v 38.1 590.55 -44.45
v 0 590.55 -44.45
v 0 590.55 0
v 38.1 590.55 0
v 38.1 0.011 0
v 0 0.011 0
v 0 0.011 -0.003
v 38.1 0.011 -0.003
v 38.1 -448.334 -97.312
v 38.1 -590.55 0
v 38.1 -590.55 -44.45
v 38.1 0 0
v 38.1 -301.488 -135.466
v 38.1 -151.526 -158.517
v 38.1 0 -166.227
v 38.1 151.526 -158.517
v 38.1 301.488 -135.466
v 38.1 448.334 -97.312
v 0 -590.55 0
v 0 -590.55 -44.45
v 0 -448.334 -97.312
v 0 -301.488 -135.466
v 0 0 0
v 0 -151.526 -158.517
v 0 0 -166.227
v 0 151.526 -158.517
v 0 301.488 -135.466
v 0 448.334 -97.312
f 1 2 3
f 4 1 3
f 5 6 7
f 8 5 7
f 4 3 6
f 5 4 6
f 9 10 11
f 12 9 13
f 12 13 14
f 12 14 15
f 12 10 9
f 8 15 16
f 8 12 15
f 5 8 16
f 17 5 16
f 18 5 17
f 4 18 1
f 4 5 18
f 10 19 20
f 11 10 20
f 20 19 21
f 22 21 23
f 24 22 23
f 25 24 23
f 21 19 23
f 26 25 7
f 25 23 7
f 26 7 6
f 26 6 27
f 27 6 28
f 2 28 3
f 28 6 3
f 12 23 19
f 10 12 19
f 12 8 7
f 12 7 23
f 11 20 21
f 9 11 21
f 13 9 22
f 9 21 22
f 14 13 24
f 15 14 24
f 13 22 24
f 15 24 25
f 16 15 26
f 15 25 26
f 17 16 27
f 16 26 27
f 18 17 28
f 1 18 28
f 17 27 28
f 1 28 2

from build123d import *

# Parameters (mm, degrees)
F0_DEPTH = 38.1


with BuildPart() as f0:
    # F2 (on Right) → F0 (new body)
    with BuildSketch(Plane.YZ):
        with BuildLine():
            Line((0, 0), (-590.55, 0))
            Line((-590.55, 0), (-590.55, -44.45))
            ThreePointArc((-590.55, -44.45), (0, -166.226991), (590.55, -44.45))
            Line((590.55, -44.45), (590.55, 0))
            Line((590.55, 0), (0.01061, 0))
            Line((0.01061, 0), (0.01061, -0.003131))
            Line((0.01061, -0.003131), (0, 0))
        make_face()
    extrude(amount=F0_DEPTH)


solid = f0.part
